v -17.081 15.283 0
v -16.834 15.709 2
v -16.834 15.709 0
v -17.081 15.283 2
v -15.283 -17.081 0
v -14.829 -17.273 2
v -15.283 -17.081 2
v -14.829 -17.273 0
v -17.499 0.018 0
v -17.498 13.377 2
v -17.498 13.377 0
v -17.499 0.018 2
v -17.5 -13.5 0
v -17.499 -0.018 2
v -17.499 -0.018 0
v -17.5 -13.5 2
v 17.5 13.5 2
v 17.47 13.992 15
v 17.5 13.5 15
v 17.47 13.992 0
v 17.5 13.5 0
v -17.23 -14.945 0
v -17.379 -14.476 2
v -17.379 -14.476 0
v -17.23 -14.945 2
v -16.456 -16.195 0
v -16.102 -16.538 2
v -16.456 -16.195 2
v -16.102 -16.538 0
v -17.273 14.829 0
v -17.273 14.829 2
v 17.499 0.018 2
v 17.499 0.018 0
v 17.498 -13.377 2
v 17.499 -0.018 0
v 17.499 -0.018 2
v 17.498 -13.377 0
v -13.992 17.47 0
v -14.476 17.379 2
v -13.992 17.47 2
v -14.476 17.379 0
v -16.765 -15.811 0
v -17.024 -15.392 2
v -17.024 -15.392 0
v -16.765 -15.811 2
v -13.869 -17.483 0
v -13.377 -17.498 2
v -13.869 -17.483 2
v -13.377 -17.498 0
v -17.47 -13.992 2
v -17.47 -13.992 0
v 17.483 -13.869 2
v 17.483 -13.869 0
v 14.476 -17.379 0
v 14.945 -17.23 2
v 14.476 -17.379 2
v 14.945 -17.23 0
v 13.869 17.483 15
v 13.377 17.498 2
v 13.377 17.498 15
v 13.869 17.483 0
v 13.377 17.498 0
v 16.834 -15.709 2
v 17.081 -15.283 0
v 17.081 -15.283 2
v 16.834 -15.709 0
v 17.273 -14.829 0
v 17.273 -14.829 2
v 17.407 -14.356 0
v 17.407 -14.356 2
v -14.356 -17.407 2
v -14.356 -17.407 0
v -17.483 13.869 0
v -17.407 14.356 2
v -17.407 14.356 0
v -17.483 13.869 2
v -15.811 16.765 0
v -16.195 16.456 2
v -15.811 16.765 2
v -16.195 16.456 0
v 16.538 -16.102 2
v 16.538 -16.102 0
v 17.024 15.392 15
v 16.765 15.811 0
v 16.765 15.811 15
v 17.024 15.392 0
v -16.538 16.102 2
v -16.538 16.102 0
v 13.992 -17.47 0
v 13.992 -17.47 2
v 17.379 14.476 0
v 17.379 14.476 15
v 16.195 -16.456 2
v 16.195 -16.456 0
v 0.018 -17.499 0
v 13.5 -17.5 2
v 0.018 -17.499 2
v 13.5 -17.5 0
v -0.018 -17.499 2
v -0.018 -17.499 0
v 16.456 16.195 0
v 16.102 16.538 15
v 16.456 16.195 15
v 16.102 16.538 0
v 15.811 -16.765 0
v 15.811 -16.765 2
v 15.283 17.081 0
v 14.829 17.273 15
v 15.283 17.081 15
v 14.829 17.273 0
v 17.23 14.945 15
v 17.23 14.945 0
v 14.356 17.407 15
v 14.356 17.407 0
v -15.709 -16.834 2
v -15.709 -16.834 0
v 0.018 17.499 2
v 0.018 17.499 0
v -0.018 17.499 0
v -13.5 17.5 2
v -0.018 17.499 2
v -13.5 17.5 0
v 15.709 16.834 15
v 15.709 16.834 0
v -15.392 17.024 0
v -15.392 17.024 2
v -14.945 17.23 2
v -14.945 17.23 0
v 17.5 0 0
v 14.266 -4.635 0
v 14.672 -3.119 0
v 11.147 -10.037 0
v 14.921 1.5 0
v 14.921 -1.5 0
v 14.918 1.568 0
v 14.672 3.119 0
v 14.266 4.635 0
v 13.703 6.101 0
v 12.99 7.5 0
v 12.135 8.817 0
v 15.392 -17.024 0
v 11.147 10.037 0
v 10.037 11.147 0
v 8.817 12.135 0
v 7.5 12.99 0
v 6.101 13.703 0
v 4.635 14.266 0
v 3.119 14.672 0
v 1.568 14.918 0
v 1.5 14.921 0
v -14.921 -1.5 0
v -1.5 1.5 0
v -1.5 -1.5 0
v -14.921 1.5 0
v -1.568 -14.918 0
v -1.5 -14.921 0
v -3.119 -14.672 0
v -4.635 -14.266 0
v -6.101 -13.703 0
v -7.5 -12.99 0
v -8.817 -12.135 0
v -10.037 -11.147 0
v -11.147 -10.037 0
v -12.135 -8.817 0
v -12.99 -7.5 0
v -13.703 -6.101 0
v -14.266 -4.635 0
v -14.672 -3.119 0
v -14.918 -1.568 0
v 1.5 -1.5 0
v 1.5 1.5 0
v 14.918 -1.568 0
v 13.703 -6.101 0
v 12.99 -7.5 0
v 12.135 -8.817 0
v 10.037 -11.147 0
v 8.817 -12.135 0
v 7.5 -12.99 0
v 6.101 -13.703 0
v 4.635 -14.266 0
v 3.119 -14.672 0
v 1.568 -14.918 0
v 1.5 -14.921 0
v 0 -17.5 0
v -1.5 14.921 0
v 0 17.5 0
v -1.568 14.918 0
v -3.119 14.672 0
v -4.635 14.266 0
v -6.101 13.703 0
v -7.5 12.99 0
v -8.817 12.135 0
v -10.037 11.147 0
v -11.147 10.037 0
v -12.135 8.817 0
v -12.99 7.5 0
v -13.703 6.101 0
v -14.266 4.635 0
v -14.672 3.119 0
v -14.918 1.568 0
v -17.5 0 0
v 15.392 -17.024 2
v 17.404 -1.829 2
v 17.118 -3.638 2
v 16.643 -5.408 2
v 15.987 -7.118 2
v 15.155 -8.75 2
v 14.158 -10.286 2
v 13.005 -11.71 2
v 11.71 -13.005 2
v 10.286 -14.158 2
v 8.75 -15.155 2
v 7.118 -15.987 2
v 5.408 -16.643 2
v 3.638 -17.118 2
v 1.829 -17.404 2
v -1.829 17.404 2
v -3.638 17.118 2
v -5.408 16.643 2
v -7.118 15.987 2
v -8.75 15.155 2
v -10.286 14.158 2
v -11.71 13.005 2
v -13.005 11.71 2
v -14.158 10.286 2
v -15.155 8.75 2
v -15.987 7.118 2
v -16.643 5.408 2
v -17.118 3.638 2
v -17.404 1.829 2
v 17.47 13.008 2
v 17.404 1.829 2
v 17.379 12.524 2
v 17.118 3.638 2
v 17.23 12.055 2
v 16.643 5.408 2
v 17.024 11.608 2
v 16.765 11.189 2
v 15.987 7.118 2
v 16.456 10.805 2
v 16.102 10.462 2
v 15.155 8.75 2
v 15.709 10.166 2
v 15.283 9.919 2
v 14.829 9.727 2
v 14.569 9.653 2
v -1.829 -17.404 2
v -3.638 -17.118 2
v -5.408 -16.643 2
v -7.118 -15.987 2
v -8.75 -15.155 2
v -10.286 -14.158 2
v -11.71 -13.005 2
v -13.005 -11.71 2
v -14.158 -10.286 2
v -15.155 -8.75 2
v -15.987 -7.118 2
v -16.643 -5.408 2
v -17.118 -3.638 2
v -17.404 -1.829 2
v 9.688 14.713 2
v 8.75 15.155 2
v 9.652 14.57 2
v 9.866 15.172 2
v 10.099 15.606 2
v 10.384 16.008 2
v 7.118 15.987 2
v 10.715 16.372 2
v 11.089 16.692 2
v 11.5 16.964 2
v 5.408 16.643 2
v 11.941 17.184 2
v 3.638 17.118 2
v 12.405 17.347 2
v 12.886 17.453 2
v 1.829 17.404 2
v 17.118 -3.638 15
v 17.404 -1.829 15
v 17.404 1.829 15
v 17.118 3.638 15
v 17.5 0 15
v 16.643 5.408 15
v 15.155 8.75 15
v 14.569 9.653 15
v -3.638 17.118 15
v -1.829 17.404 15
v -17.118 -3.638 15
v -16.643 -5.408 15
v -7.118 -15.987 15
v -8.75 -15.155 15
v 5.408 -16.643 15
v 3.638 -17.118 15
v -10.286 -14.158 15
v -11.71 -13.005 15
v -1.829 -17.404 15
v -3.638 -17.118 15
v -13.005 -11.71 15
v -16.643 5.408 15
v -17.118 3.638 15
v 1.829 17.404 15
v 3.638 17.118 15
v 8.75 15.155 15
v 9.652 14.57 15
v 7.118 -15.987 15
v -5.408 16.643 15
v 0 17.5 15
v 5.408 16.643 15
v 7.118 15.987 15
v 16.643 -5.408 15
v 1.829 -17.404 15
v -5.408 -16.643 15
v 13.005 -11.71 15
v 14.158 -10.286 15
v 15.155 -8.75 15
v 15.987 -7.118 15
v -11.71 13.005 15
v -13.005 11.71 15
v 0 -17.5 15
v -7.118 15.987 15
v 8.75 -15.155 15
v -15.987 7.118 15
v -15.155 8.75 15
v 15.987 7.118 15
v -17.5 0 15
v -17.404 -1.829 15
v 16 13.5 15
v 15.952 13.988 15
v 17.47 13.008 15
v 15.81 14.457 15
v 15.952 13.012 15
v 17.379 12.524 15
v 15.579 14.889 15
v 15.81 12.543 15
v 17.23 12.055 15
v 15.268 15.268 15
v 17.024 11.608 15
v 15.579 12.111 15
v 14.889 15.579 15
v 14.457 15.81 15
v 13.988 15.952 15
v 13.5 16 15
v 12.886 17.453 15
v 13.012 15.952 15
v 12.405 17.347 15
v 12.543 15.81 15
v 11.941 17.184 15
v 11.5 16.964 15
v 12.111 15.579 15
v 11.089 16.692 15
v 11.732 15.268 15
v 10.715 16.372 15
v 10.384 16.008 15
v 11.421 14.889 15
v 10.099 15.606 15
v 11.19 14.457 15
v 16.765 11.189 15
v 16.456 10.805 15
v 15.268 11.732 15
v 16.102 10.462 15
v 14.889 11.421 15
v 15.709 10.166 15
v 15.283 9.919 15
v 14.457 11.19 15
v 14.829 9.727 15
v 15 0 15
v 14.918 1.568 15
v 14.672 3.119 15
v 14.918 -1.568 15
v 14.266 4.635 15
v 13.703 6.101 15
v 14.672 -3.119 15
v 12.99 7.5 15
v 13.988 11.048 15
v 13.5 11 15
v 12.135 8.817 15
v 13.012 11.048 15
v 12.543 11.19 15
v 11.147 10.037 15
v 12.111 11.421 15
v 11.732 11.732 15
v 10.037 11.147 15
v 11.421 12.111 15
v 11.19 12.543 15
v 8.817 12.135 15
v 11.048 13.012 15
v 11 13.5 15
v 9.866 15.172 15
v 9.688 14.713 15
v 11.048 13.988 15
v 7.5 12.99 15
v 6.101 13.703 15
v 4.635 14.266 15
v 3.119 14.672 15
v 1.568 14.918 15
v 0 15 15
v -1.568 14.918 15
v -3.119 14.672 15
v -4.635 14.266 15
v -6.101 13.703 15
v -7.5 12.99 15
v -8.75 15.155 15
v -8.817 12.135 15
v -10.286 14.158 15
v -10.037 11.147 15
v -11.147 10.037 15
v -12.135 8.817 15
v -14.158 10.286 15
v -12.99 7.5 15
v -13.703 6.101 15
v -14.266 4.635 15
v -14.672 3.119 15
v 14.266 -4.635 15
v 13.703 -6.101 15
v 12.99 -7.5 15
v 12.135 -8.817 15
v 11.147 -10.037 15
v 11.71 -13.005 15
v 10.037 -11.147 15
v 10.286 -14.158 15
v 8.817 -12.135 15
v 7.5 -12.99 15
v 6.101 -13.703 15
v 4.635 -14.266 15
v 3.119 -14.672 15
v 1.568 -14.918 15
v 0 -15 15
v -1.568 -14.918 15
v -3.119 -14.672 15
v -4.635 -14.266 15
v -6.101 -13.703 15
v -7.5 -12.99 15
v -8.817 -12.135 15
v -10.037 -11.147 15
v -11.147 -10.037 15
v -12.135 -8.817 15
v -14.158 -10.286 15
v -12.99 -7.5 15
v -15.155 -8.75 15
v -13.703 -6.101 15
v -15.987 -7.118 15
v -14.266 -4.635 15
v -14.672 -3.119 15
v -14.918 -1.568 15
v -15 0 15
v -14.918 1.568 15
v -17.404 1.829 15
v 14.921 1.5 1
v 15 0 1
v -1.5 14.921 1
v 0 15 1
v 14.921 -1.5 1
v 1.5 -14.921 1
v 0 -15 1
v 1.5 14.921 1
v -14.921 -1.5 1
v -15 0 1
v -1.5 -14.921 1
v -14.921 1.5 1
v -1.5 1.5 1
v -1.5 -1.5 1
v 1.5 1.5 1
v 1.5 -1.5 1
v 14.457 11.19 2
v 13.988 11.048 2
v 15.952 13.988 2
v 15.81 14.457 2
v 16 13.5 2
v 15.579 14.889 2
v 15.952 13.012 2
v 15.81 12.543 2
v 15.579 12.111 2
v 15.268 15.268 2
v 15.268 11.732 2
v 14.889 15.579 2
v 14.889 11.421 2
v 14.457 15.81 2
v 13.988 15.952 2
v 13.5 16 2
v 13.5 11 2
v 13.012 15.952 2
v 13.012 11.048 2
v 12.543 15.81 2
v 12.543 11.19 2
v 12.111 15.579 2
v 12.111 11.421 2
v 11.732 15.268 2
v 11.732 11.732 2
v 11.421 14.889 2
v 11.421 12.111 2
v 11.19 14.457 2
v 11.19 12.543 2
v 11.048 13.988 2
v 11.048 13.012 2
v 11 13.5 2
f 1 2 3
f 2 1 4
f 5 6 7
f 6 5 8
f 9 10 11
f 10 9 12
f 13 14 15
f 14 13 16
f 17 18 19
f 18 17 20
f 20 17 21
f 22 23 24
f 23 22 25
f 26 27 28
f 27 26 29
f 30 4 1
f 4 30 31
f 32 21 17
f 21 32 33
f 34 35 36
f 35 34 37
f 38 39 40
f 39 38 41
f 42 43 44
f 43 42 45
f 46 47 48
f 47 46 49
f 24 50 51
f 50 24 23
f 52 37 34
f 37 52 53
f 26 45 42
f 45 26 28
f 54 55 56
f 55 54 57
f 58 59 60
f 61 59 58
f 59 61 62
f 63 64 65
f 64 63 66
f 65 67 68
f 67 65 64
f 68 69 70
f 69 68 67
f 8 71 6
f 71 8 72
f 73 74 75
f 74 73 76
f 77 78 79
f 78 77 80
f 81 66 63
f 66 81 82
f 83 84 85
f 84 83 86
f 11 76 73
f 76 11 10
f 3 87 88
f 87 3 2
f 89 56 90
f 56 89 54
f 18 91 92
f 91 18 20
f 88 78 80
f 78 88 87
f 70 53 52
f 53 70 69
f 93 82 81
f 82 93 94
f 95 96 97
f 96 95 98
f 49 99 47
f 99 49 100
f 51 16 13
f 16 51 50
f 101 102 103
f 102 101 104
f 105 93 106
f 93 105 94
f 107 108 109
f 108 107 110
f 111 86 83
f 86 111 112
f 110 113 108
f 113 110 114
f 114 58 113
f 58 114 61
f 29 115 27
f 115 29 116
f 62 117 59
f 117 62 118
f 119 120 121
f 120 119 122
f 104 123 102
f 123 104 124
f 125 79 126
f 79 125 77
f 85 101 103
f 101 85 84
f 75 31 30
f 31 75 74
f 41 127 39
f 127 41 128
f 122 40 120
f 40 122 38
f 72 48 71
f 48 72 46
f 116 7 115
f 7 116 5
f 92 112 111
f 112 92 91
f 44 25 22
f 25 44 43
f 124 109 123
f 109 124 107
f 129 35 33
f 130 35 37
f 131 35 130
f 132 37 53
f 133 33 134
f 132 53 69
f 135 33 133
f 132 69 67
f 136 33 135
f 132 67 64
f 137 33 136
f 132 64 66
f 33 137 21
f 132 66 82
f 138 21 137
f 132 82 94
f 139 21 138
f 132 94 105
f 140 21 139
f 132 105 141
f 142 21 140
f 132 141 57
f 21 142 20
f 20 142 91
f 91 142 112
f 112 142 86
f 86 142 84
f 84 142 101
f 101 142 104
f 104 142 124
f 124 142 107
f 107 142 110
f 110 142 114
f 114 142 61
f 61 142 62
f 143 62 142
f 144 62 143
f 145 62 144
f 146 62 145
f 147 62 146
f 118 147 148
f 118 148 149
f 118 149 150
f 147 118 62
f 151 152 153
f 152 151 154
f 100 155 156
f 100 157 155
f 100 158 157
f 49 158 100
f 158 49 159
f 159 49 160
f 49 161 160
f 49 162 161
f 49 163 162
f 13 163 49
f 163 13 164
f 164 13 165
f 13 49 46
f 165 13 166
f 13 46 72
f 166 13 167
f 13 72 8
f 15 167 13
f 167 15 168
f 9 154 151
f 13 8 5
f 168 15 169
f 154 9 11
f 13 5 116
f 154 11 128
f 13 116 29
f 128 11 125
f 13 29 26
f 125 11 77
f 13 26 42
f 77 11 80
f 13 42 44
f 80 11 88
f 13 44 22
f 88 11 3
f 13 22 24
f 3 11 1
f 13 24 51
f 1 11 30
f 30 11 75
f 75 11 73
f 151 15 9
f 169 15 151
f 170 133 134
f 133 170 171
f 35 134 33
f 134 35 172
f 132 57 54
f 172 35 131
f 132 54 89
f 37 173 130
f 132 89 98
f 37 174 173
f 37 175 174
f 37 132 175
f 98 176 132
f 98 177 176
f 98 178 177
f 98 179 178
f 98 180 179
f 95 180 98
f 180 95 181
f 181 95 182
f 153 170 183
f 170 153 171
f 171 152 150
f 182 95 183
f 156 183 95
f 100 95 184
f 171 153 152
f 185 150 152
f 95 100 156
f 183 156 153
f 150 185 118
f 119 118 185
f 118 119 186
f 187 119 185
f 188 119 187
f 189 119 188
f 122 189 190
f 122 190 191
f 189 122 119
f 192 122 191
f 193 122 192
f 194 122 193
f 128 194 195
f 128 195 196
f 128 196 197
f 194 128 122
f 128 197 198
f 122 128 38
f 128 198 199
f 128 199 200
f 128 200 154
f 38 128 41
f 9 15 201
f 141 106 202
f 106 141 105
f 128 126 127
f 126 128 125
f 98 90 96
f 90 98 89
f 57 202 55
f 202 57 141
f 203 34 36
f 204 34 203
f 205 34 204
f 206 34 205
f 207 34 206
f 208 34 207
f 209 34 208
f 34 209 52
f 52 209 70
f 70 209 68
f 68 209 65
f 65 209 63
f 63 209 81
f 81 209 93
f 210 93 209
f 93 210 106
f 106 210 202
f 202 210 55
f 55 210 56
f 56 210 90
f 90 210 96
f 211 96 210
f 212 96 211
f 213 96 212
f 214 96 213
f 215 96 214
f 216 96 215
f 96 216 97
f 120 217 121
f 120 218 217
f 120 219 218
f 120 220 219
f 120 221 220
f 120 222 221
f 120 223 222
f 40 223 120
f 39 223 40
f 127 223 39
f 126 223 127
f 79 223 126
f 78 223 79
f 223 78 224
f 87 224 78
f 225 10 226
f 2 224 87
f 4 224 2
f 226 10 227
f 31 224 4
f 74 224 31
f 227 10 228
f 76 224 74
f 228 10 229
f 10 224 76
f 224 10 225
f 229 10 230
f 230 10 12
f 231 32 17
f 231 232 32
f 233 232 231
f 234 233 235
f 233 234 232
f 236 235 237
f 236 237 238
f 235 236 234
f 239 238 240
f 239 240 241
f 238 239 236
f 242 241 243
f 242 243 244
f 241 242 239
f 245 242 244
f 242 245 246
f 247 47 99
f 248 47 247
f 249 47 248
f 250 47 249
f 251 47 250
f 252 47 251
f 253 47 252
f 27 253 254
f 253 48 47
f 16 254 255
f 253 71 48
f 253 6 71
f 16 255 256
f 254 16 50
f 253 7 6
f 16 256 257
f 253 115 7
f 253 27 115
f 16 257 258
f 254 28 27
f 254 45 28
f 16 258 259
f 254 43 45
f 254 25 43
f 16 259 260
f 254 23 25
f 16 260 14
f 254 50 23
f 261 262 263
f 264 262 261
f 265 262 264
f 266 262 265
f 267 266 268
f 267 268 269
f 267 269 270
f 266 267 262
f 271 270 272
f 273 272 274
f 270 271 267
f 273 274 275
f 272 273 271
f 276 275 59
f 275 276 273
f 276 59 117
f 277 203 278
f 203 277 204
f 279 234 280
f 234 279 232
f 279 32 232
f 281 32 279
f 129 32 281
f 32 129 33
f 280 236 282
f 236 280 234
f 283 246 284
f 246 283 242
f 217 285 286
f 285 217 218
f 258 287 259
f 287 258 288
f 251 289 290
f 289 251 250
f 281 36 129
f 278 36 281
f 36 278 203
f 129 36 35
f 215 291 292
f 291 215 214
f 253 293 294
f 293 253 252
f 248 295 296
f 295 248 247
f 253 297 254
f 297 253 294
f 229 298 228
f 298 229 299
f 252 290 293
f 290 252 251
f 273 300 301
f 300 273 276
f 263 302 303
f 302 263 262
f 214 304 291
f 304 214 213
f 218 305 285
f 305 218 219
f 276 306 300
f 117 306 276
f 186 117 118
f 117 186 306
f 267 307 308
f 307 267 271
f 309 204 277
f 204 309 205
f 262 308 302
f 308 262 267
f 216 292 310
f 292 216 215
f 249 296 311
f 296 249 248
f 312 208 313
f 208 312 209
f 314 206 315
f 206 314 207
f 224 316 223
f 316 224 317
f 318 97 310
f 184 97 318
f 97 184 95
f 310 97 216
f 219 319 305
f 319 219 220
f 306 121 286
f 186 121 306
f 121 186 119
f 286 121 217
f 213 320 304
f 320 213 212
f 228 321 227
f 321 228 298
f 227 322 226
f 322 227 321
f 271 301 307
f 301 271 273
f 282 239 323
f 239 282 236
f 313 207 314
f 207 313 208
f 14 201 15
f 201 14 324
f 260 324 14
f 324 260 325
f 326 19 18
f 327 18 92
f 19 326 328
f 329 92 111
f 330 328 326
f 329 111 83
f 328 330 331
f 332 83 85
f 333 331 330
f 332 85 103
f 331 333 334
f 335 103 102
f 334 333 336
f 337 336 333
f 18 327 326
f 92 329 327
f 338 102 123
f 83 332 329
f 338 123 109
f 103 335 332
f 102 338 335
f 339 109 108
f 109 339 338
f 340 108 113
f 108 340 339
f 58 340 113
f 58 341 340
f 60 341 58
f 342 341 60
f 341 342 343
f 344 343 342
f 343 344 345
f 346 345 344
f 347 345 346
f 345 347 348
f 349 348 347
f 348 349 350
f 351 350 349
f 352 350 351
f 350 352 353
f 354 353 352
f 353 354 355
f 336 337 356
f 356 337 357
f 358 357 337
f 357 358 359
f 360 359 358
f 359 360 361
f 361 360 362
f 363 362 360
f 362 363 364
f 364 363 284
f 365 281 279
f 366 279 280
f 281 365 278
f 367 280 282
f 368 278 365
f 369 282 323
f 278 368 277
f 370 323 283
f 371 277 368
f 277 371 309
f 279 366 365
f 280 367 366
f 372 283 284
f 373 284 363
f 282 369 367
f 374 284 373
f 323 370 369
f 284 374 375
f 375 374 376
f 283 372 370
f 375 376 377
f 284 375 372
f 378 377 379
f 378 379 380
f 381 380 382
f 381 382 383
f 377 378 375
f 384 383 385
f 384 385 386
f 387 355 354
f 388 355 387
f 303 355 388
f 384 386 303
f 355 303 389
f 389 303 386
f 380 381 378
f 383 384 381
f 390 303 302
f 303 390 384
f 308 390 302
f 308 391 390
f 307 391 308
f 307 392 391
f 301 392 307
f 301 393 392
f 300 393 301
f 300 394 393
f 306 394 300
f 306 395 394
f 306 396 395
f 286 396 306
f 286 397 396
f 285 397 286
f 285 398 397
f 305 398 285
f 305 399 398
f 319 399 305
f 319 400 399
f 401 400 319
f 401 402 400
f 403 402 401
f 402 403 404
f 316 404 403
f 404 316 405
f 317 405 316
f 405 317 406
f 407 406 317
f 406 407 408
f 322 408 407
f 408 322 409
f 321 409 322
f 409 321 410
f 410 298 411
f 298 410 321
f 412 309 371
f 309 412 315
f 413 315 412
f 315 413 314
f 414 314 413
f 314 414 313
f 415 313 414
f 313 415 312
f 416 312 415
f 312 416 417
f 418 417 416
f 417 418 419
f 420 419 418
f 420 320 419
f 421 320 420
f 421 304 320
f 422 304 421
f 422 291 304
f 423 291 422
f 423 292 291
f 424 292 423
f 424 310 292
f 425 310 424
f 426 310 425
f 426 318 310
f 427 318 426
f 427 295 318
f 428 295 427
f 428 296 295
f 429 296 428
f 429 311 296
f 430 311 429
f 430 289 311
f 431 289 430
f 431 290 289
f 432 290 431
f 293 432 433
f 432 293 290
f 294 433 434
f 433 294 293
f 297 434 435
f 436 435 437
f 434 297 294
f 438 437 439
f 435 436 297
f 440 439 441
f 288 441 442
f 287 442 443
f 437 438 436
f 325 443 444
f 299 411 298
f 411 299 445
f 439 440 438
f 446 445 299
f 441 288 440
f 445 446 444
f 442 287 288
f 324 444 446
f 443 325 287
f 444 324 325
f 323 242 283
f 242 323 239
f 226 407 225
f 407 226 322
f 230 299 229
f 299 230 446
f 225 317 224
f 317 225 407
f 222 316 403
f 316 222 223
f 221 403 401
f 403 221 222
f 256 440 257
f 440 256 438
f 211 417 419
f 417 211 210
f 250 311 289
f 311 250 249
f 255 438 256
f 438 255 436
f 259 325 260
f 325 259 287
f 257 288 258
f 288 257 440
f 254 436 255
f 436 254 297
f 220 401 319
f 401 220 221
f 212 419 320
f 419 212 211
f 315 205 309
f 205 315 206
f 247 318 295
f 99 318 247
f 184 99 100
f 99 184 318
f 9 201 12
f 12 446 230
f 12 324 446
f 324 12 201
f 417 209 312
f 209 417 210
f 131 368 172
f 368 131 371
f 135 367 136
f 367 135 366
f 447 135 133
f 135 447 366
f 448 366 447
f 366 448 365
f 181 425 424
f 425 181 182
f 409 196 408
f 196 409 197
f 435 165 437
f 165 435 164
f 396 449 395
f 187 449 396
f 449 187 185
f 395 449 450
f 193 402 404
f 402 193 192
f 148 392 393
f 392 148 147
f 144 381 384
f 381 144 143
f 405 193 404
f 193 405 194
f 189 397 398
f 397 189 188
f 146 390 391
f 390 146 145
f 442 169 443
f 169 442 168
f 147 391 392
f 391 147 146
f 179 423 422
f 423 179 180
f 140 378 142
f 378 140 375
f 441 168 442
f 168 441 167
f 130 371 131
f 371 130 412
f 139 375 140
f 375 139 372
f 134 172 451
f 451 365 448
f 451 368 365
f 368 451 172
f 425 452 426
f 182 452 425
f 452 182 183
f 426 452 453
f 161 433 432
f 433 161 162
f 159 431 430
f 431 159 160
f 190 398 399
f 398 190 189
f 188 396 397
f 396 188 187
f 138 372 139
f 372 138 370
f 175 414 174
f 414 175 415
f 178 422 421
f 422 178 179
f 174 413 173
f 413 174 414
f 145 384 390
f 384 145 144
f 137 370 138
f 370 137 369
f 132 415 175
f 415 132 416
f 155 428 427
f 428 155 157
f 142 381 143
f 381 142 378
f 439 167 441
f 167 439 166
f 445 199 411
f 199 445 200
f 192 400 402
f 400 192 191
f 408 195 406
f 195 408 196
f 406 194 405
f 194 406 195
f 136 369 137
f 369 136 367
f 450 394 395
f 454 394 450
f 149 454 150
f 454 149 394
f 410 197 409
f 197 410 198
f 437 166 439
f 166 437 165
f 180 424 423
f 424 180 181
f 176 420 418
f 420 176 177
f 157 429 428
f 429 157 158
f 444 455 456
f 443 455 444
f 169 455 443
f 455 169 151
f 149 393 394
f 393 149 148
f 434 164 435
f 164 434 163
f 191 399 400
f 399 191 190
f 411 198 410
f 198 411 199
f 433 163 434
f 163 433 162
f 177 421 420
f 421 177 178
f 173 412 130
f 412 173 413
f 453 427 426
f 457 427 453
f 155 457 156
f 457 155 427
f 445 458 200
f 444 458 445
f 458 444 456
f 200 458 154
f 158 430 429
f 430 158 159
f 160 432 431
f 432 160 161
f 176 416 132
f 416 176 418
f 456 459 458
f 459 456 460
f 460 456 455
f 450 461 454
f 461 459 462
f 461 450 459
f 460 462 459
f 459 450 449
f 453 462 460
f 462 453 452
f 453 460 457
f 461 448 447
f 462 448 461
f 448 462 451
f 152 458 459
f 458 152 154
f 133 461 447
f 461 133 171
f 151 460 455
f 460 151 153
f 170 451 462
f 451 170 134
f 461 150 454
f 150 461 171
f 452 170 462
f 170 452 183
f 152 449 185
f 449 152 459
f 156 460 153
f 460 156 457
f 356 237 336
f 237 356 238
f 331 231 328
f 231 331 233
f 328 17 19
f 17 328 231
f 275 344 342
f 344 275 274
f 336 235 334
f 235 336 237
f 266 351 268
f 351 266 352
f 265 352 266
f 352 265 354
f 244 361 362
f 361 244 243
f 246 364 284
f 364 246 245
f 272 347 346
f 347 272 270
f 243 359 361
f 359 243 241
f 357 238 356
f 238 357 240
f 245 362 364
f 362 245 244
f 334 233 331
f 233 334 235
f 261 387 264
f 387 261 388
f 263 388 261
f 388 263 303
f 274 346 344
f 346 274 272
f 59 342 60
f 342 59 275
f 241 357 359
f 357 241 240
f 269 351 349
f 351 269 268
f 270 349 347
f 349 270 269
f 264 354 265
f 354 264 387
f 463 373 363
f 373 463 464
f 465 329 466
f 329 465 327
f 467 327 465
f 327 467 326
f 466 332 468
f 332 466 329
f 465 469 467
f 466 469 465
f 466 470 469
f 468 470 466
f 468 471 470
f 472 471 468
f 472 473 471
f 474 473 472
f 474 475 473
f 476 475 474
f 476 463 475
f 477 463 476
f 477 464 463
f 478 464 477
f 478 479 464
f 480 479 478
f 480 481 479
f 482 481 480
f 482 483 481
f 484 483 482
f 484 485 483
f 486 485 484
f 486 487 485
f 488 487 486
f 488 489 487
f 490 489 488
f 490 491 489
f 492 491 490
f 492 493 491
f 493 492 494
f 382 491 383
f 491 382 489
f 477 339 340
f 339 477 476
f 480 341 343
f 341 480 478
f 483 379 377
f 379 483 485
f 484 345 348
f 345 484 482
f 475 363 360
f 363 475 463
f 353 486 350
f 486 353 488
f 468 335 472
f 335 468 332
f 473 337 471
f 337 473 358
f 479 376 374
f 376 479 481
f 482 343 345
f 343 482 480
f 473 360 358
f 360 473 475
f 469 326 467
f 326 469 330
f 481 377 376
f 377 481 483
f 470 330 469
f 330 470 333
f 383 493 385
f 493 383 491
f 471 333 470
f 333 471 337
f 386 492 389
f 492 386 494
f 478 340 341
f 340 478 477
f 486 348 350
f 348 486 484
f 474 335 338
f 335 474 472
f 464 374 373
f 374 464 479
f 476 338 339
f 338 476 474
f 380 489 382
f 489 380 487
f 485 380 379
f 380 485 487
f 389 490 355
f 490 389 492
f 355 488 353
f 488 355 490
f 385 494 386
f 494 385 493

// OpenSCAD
/*
 * A simple holder for a bottle and pipette.
 *
 * Useful for storing small volumes of liquids together with a pipette. Useful for paint/coloring, extracts (such as from chili peppers), and solvents (just make sure your bottle is HDPE!).
 */

// Parameters
height = 15;        // Height of the holder
base_width = 35;    // Width of the base
bottle_width = 30;  // Inner diameter of the bottle hole
pipette_width = 5;  // Inner diameter of the pipette hole
rounding = 4;       // Outer diameter of pipette holder

// # Manual reference measurements
//
// 30ml HDPE bottle: Diameter ~30mm
// 1ml pipette: Cylinder diameter ~5mm, tip diameter: ?mm

// # First print
//
// 28mm bottle width was too tight. 
// 5mm pipette width fit the tip perfectly.

// Increase resolution a bit
$fa = 6;
$fs = 0.5;

module cross(width, height, crosswidth=1) {
    color("red")
    union() {
        translate([0, 0, height/2])
            cube([width, crosswidth, height], center=true);
        translate([0, 0, height/2])
            cube([crosswidth, width, height], center=true);
    }
}

module base(width, rounding) {
    hull() {
        for(corner = [0, 1, 2, 3]) {
            rotate([0, 0, corner*90])
            translate([width/2 - rounding, width/2 - rounding, 0])
                cylinder(r=rounding, h=2);
        }
    }
}

union() {
    difference() {
        pipette_offset = base_width/2 - rounding;
        
        union() {
            // Tube that holds bottle
            difference() {
                union() {
                    // Rounded rectangle base
                    base(base_width, rounding=rounding);
                    cylinder(d=base_width, h=height);
                }
                
                // Center hole where cross is placed
                cylinder(d=bottle_width, h=3*height, center=true);
            }
            
            // Bottom cross
            cross(1.05*bottle_width, 1, crosswidth=3);
    
            // Pipette holder in corner
            translate([pipette_offset, pipette_offset, 0])
                cylinder(r=rounding, h=height);
        }
    
        // Hole in pipette holder
        translate([pipette_offset, pipette_offset, 2])
            cylinder(d=pipette_width, h=20);
    }
}
